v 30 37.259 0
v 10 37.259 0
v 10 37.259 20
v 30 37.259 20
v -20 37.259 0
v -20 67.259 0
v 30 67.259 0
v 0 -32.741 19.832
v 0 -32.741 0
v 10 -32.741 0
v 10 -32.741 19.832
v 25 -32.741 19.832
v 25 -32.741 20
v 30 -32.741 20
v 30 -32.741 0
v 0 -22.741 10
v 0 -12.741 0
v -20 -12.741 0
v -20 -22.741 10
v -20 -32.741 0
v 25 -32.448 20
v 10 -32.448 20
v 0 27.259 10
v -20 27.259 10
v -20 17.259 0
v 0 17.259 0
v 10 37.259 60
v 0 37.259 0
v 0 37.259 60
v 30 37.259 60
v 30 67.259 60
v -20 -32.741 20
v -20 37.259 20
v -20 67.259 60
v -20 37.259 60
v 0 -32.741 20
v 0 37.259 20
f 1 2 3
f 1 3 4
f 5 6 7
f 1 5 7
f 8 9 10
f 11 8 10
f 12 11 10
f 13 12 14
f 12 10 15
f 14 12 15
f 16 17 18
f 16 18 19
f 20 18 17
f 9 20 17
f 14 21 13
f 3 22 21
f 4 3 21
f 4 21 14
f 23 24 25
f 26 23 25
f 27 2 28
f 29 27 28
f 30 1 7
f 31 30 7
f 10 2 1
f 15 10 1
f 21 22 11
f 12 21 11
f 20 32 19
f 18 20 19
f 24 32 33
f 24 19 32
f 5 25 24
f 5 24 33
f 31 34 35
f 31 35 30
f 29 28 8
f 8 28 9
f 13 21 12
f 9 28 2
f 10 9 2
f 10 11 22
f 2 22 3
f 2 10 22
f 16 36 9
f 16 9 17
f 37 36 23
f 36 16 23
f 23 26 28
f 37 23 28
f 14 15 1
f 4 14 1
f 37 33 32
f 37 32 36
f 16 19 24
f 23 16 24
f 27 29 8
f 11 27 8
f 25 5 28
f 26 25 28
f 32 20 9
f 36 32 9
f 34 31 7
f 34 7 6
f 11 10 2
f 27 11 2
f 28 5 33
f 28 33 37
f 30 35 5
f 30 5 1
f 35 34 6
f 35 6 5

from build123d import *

# Parameters (mm, degrees)
F0_W     = 20
F0_H     = 70
F1_DEPTH = 20
F2_DEPTH = 60
F3_DEPTH = 60
F5_DEPTH = 25
F6_W     = 30
F6_H     = 10
F7_DEPTH = 107


with BuildPart() as f1:
    # F0 (on Top) → F1 (new body)
    with BuildSketch(Plane.XY):
        with Locations((-10, 2.2590903938)):
            Rectangle(F0_W, F0_H)
    extrude(amount=F1_DEPTH)

    # F6 (on face) → F7 (cut)
    with BuildSketch(Plane(origin=(-20, 0, 0), x_dir=(0, -1, 0), z_dir=(-1, 0, 0))):
        with Locations((-2.2590903938, 5)):
            Rectangle(F6_W, F6_H)
        Polygon((-27.2590903938, 10), (-17.2590903938, 0), (-17.2590903938, 10), align=None)
        Polygon((12.7409096062, 10), (12.7409096062, 0), (22.7409096062, 10), align=None)
    extrude(amount=-F7_DEPTH, mode=Mode.SUBTRACT)


with BuildPart() as f1b:
    # F0 (on Top) → F1, piece 2 (new body)
    with BuildSketch(Plane.XY):
        with Locations((20, 2.2590903938)):
            Rectangle(F0_W, F0_H)
    extrude(amount=F1_DEPTH)


with BuildPart() as f2:
    # F0 (on Top) → F2 (new body)
    with BuildSketch(Plane.XY):
        Polygon((30, 67.2590903938), (-20, 67.2590903938), (-20, 37.2590903938), (0, 37.2590903938), (5, 37.2590903938), (10, 37.2590903938), (30, 37.2590903938), align=None)
    extrude(amount=F2_DEPTH)


with BuildPart() as f3:
    # F0 (on Top) → F3 (new body)
    with BuildSketch(Plane.XY):
        Polygon((5, 37.2590903938), (0, 37.2590903938), (0, -32.7409096062), (10, -32.7409096062), (10, 37.2590903938), align=None)
    extrude(amount=F3_DEPTH)


with BuildPart() as f5_tool:
    # F4 (on face) → F5 (new body)
    with BuildSketch(Plane(origin=(0, 0, 0), x_dir=(0, -1, 0), z_dir=(-1, 0, 0))):
        Polygon((32.7409096062, 60), (-37.2590903938, 60), (32.7409096062, 19.8320876807), align=None)
    extrude(amount=-F5_DEPTH)


with BuildPart() as f1b_1:
    add(f1b.part)

    # F5: cut by f5_tool
    add(f5_tool.part, mode=Mode.SUBTRACT)


with BuildPart() as f3_1:
    add(f3.part)

    # F5: cut by f5_tool
    add(f5_tool.part, mode=Mode.SUBTRACT)


solid = Compound([f1.part, f2.part, f1b_1.part, f3_1.part])
